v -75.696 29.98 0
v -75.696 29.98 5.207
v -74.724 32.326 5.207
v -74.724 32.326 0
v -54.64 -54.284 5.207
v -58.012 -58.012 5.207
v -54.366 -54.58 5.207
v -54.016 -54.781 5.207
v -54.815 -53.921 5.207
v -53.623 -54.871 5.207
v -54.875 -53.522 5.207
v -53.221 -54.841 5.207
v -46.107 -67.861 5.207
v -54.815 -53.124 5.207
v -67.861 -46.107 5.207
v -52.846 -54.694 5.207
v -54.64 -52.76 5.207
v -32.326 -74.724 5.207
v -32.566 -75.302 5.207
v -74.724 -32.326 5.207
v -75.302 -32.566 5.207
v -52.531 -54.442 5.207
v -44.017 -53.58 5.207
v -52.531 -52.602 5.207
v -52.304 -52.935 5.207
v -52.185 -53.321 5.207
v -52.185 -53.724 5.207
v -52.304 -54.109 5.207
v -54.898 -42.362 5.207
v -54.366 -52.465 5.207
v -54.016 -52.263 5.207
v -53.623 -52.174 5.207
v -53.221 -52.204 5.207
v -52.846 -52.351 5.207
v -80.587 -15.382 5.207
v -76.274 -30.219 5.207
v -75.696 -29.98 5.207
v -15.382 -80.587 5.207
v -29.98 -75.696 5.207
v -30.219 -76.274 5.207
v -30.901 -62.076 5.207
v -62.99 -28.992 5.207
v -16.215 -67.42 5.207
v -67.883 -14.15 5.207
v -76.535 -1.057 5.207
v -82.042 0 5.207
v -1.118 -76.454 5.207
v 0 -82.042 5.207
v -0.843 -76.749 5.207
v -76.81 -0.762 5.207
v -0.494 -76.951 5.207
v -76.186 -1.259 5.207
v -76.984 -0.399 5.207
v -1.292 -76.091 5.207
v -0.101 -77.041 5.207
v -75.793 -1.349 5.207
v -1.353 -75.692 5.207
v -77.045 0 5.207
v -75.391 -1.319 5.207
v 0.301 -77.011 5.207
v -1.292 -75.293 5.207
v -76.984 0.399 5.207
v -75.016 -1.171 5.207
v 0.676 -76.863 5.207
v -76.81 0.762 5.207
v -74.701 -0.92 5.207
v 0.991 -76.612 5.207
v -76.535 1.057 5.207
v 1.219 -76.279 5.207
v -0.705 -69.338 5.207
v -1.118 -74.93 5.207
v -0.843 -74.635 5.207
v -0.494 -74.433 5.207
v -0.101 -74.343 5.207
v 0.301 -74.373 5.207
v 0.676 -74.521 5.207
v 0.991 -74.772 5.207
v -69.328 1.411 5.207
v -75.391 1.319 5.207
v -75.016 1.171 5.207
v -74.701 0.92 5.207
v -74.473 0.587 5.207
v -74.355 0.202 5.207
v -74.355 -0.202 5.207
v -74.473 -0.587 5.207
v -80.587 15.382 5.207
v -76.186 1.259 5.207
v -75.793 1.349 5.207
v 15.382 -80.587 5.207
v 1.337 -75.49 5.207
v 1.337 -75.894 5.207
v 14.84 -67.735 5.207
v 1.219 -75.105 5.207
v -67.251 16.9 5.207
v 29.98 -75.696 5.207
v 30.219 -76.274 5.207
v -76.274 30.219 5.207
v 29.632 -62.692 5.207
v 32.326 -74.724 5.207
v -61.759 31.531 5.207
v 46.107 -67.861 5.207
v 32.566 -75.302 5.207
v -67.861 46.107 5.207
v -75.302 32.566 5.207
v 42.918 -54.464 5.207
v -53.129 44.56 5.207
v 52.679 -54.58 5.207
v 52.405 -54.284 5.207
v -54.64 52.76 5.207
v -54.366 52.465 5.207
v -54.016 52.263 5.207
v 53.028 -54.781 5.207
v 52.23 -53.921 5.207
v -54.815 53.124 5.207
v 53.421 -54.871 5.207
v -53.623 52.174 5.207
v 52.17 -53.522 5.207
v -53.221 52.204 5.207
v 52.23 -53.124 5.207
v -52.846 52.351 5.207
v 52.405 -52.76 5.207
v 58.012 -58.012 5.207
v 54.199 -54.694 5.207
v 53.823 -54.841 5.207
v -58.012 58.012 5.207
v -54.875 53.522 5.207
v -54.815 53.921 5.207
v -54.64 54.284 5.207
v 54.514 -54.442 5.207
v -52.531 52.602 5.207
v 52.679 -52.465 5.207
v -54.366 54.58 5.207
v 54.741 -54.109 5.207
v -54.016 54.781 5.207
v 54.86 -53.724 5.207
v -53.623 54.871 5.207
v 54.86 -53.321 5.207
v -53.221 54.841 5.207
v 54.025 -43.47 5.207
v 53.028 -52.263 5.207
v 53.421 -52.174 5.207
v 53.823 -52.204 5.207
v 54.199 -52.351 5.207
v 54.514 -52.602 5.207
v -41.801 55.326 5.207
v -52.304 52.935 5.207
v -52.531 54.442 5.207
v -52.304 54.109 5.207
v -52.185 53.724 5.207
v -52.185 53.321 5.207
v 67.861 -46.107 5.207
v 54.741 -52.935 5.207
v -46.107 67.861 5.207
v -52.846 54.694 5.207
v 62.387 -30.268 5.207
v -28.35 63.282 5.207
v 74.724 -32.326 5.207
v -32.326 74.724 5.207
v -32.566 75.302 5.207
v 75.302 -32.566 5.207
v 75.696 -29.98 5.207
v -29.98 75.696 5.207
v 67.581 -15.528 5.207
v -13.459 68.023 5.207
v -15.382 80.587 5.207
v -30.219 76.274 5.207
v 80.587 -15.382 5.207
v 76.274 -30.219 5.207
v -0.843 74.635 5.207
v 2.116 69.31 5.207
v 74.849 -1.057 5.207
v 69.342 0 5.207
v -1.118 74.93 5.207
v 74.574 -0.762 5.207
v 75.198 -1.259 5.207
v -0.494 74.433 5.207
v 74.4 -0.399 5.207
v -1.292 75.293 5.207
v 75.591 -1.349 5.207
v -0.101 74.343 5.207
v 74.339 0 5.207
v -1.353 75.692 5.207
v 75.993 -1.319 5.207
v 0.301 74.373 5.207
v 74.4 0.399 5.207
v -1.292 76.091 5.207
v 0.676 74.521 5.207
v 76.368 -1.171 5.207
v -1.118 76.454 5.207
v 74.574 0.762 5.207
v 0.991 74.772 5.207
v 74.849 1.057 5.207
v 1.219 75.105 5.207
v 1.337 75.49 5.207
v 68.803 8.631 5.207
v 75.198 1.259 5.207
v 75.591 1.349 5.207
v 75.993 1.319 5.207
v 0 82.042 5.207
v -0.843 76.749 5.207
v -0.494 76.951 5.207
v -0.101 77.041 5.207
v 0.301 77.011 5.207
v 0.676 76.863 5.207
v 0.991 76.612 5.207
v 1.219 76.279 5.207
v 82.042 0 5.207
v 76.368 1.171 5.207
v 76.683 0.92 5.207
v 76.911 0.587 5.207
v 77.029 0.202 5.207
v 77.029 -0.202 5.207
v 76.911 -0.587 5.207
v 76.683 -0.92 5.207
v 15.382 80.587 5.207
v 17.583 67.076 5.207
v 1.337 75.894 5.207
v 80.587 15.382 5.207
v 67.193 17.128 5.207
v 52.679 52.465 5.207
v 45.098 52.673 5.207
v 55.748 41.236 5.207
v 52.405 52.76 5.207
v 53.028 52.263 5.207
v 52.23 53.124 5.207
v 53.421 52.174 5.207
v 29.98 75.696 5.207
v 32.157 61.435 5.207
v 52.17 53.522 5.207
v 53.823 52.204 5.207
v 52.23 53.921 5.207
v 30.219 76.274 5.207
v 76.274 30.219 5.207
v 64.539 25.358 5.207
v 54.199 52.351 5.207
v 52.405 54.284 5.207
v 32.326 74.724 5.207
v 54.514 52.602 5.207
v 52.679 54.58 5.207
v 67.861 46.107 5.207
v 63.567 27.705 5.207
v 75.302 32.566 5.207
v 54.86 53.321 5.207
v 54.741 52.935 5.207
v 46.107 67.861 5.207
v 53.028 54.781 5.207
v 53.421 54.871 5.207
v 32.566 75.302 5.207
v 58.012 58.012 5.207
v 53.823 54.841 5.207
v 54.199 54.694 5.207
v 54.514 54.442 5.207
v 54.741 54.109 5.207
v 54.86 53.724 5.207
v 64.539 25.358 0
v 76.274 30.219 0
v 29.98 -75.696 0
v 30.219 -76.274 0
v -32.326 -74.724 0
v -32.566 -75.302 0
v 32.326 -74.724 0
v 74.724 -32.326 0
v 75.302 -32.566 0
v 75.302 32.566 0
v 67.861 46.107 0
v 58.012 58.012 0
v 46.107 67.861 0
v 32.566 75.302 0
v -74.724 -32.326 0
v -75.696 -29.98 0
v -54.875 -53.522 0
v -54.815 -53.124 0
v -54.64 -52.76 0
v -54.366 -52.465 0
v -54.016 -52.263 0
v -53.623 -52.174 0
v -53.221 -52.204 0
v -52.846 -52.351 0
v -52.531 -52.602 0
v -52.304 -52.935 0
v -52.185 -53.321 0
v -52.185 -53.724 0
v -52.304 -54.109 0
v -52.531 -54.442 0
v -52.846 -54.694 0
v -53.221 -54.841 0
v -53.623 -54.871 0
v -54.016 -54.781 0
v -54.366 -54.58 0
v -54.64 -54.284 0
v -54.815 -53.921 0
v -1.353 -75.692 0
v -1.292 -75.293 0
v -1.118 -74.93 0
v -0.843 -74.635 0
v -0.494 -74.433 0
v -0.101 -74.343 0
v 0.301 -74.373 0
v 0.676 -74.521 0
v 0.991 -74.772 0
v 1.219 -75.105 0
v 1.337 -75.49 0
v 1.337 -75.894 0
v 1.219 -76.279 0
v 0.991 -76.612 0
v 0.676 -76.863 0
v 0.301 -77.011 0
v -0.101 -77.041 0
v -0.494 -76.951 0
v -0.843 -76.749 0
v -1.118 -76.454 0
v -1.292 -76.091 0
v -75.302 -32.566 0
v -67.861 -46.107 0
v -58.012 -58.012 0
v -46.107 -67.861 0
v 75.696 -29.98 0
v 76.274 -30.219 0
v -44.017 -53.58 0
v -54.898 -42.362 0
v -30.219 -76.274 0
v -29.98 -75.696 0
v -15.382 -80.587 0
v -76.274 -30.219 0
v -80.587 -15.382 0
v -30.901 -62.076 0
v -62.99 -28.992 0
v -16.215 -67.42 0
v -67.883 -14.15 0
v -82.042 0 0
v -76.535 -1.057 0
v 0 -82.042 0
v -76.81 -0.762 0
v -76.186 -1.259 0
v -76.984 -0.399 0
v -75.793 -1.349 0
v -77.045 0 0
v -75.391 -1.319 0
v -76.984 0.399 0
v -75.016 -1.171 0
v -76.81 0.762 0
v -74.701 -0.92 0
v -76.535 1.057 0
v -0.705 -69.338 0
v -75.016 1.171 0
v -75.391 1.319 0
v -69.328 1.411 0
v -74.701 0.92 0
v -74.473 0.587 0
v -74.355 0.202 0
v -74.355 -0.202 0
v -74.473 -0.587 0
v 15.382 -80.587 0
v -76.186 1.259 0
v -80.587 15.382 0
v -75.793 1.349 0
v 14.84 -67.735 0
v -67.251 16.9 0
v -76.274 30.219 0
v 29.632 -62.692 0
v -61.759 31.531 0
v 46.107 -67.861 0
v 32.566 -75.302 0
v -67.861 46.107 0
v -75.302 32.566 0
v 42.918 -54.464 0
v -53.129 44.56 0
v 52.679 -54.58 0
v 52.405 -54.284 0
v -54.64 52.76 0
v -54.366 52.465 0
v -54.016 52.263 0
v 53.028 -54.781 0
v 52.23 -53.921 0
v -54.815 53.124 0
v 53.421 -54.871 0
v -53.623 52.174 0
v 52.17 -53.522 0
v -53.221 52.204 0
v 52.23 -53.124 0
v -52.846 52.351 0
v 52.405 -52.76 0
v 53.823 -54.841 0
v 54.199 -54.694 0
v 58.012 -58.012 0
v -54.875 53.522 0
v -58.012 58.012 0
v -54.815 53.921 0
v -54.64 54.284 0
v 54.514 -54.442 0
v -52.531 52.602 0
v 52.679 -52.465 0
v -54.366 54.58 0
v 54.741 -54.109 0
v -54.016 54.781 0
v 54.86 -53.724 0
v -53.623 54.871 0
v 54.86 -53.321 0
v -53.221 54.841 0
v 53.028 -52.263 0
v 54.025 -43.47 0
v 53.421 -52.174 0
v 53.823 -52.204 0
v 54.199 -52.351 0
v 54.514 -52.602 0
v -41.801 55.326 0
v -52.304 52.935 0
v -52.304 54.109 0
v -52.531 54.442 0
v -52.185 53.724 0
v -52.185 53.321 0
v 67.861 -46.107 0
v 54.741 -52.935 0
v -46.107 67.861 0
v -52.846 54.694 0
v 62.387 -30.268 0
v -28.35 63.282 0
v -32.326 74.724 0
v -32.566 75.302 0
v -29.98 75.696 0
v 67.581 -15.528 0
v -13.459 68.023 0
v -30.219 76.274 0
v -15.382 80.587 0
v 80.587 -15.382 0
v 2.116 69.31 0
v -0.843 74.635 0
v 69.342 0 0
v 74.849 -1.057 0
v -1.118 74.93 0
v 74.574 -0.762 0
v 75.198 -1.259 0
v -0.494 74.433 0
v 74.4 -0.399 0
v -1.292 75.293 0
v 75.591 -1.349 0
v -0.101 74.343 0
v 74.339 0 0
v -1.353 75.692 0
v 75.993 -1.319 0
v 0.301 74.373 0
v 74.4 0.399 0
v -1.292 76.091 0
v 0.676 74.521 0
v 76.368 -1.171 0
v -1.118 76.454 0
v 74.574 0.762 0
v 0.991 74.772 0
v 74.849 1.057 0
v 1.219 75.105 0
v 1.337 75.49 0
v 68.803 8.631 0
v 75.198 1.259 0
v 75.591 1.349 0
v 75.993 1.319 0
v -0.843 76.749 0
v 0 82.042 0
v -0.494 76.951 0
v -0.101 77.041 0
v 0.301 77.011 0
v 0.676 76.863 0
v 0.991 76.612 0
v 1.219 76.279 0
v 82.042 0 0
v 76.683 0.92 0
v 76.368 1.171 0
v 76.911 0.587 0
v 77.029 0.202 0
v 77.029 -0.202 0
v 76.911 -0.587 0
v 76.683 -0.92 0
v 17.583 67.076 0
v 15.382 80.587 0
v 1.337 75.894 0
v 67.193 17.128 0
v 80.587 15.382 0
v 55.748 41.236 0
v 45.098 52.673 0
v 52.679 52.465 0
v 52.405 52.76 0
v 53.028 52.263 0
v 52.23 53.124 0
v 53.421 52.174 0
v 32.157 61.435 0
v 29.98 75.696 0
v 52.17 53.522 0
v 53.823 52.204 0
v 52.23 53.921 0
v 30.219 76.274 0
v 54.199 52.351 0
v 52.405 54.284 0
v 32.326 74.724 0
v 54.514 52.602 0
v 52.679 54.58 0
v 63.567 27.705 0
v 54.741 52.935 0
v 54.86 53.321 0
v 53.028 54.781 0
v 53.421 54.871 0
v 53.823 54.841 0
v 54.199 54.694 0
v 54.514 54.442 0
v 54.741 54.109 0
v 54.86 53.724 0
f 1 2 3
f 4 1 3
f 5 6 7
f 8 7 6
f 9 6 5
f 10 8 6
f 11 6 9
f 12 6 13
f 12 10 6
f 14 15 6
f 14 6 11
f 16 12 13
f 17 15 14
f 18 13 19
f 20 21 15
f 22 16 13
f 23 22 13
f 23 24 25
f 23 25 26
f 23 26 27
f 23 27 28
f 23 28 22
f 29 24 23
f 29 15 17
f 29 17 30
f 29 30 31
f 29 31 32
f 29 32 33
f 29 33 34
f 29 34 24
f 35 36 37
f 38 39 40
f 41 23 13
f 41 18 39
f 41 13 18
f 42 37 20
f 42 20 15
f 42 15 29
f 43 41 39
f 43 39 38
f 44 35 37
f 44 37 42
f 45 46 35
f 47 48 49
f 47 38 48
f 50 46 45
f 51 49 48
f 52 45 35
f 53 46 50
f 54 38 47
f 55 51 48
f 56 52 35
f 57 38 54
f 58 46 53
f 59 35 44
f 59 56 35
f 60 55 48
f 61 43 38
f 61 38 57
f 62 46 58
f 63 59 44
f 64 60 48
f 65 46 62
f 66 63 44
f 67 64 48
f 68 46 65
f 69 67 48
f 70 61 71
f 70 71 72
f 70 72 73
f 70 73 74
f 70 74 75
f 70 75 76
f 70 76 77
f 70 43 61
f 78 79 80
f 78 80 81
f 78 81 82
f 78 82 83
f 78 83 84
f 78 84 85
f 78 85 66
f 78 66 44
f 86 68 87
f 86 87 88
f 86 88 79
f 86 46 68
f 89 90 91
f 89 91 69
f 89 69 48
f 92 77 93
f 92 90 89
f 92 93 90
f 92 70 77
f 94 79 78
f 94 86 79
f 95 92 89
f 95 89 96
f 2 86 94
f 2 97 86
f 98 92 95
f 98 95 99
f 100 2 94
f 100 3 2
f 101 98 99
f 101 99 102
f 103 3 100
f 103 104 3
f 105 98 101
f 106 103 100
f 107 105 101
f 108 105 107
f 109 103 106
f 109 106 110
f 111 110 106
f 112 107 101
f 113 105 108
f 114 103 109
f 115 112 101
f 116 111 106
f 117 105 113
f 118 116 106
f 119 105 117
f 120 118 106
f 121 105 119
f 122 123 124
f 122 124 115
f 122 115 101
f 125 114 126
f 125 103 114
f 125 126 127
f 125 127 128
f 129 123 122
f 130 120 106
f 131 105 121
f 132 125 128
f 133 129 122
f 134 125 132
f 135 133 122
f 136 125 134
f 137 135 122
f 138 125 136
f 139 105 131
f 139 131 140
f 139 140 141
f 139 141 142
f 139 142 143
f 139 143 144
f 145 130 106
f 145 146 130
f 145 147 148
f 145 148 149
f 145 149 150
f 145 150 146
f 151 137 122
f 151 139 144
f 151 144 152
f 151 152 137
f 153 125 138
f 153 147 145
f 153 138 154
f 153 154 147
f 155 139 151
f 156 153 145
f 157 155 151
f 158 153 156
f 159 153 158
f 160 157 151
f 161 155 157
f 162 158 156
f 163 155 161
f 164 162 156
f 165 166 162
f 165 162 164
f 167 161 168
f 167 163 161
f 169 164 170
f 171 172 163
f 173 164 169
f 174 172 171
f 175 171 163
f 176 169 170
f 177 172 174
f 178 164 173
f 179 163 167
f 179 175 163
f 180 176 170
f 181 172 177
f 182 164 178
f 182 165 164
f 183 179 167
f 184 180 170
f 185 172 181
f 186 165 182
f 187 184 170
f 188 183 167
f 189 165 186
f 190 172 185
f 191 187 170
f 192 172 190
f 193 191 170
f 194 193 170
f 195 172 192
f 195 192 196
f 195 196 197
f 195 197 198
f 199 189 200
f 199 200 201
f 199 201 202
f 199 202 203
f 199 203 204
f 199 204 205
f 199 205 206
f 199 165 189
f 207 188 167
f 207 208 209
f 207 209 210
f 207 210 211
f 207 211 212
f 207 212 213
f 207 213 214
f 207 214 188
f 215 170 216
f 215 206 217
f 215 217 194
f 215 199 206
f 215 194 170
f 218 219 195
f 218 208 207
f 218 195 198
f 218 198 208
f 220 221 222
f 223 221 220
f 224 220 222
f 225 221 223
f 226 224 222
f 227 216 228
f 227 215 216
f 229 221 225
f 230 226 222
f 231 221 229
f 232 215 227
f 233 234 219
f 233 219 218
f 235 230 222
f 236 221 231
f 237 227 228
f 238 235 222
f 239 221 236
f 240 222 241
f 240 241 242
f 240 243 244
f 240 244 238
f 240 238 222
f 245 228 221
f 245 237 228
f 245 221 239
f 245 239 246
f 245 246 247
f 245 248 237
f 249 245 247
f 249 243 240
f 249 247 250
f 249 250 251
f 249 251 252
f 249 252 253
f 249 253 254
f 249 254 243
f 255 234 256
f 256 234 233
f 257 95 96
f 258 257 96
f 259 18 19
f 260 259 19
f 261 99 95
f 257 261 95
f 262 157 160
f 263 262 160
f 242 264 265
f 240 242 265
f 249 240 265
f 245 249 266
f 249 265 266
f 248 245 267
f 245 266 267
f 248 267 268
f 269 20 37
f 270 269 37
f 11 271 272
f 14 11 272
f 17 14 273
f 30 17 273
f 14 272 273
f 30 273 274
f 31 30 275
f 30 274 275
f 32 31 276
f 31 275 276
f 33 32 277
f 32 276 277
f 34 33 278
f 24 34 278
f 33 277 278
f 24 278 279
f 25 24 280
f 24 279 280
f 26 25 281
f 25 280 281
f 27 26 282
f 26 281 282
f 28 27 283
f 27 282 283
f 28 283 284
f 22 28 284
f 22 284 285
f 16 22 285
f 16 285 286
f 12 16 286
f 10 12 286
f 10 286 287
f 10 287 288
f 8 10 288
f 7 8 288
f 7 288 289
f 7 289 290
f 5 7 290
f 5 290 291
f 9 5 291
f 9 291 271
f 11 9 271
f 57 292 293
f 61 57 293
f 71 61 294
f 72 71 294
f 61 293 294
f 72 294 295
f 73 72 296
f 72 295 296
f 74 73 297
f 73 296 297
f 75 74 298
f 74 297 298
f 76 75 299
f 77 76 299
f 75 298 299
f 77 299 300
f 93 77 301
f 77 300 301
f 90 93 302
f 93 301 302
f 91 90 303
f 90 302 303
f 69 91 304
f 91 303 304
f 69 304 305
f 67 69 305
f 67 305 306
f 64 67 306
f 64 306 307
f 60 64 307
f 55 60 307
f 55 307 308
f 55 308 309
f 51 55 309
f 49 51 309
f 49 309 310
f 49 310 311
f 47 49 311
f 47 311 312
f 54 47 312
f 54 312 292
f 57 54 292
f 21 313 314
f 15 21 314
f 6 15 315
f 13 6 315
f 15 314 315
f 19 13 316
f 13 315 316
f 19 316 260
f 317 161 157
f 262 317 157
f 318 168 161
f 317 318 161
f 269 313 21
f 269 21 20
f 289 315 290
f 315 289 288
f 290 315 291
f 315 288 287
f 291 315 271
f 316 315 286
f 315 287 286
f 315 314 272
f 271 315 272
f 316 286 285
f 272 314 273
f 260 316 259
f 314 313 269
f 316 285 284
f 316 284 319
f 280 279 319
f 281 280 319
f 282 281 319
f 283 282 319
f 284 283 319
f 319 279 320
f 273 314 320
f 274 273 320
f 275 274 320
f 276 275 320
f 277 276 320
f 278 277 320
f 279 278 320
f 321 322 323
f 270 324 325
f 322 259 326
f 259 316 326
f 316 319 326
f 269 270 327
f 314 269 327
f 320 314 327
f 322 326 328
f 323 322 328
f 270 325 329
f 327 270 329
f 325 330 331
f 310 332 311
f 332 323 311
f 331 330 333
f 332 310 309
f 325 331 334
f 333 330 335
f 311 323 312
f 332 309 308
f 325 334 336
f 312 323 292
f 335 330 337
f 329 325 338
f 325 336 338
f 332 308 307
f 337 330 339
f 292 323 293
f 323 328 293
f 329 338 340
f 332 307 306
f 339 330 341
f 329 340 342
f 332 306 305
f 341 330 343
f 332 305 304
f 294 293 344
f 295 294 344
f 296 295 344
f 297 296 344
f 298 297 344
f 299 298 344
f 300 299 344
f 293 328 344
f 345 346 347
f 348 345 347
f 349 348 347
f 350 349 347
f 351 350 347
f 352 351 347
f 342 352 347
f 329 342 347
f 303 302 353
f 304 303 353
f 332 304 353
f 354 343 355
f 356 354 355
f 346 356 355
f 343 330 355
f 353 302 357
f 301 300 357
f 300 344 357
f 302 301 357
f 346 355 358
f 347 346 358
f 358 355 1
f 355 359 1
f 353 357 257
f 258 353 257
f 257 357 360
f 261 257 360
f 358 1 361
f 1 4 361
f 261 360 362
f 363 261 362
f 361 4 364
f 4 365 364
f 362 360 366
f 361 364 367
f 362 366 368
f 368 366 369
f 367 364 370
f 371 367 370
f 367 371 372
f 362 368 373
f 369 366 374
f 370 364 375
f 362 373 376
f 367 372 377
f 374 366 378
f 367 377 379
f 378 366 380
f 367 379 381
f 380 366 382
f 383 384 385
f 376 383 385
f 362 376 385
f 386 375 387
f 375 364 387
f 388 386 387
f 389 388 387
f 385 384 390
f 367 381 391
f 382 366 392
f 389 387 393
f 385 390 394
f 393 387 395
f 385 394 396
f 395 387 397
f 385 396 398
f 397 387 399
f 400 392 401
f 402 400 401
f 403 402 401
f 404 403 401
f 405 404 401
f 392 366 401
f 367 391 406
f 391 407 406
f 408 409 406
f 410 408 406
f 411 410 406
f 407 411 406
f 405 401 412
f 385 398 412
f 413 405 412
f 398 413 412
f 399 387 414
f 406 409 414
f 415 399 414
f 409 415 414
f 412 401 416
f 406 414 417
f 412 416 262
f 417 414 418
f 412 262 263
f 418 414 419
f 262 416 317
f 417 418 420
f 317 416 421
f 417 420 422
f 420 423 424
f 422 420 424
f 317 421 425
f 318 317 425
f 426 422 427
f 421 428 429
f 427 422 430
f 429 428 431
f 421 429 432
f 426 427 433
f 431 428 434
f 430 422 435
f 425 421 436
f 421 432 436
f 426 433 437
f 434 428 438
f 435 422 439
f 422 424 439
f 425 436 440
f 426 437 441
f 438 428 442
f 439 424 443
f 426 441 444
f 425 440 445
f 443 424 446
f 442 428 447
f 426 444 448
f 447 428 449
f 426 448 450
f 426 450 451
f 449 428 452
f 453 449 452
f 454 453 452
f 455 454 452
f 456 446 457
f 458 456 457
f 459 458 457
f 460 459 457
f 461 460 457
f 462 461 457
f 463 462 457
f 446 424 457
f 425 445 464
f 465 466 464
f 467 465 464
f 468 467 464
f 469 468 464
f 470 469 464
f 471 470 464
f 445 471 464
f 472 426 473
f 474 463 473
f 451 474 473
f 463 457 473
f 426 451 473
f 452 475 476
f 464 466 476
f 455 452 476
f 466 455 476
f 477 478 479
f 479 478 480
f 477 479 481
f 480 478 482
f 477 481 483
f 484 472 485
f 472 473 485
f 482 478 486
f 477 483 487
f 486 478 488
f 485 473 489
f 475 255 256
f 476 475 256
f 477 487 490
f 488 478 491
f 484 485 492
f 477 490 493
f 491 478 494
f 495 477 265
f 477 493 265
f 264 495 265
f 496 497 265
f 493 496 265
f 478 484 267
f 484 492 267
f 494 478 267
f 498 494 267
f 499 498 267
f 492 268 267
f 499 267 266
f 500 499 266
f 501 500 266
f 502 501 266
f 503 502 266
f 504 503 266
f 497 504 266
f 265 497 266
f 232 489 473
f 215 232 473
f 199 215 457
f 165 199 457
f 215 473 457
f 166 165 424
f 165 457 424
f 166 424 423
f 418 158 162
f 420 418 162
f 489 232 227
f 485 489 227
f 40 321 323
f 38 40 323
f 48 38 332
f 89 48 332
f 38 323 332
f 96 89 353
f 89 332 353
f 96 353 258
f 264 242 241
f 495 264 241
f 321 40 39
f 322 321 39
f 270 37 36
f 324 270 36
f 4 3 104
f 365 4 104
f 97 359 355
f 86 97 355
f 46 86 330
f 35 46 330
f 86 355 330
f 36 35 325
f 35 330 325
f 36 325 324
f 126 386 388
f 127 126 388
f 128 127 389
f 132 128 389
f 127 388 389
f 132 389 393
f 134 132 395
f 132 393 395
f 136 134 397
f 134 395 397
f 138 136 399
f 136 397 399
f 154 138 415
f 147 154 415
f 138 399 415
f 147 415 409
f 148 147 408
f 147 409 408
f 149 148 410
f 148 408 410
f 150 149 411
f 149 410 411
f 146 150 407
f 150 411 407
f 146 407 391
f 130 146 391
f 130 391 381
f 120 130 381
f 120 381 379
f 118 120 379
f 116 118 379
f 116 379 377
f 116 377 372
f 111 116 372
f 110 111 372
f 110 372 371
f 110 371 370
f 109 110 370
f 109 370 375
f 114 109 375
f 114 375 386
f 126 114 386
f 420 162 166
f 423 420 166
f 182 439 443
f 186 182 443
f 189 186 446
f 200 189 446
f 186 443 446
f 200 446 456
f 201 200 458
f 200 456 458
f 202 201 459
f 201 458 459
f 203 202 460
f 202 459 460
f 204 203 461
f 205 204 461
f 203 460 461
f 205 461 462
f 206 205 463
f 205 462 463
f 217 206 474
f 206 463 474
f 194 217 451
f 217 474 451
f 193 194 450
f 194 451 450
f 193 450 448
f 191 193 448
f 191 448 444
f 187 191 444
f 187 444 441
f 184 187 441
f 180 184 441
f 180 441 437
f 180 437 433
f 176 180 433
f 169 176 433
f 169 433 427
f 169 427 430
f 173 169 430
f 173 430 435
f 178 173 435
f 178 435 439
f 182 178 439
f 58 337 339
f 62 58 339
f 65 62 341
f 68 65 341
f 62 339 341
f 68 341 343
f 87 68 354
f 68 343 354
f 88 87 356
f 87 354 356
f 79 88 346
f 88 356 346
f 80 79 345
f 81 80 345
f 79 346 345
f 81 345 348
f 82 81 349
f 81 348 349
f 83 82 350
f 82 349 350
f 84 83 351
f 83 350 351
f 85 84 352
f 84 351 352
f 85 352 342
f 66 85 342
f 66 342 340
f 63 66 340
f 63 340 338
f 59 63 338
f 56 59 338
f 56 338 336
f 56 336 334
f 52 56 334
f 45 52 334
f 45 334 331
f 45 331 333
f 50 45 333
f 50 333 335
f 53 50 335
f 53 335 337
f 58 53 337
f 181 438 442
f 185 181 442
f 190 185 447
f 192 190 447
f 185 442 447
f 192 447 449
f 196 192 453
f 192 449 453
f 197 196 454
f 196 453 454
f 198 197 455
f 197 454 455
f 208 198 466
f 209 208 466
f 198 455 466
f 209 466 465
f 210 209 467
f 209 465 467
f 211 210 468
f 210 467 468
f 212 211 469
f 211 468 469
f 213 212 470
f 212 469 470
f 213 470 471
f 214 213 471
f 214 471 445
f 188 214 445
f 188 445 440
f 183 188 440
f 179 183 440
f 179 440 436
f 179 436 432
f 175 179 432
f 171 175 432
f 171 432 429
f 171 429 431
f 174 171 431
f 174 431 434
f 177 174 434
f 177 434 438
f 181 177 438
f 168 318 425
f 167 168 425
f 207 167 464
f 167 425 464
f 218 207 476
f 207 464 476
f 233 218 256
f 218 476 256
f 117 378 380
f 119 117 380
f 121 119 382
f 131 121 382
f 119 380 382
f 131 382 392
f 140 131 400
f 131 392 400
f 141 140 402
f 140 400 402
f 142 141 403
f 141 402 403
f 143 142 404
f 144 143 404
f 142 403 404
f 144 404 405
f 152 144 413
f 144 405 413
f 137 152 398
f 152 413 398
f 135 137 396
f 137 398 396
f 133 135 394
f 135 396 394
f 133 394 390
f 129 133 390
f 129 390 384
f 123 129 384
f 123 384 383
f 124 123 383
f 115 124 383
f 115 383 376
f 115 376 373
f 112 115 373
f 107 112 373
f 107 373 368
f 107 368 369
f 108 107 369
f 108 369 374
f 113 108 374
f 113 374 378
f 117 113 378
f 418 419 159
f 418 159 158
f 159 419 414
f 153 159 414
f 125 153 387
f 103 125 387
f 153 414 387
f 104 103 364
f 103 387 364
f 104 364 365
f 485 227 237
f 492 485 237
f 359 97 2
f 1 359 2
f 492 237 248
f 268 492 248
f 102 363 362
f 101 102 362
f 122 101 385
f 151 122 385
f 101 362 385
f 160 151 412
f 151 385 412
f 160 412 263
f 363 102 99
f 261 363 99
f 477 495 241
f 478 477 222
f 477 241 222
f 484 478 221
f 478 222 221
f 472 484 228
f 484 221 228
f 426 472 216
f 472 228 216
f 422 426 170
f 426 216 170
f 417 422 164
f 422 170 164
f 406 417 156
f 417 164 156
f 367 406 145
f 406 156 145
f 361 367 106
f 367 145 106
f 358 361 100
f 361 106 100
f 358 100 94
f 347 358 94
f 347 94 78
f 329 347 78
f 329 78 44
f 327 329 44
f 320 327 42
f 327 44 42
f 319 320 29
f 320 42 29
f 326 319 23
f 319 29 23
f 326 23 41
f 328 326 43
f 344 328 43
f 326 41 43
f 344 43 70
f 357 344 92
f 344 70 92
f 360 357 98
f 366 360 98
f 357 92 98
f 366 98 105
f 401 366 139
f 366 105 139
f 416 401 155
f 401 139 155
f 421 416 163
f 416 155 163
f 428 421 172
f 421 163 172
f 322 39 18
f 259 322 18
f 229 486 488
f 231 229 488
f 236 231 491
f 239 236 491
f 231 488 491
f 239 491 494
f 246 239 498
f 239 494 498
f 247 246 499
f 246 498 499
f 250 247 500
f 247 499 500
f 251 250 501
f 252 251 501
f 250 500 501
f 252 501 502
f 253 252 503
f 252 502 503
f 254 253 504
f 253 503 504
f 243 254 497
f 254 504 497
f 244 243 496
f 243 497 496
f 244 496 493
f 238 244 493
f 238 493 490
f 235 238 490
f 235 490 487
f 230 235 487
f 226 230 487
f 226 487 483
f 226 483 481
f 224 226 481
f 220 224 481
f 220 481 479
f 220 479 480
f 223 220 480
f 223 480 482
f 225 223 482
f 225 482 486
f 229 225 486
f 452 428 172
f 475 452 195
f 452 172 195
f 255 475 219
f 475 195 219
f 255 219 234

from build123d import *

# Parameters (mm, degrees)
SKETCH4_R             = 82.042
BOSS_EXTRUDE2_DEPTH   = 5.207
SKETCH5_R             = 69.342
CUT_EXTRUDE5_DEPTH    = 6.207
CUT_EXTRUDE11_DEPTH   = 6.207
F_6_32_TAPPED_HOLE1_D = 2.7051


with BuildPart() as part:
    # Sketch4 → Boss-Extrude2 (new body)
    with BuildSketch(Plane.XY):
        Circle(SKETCH4_R)
    extrude(amount=BOSS_EXTRUDE2_DEPTH)

    # Sketch5 → Cut-Extrude5 (cut, through all)
    with BuildSketch(Plane.XY.offset(5.207)):
        Circle(SKETCH5_R)
    extrude(amount=-CUT_EXTRUDE5_DEPTH, mode=Mode.SUBTRACT)

    # Sketch8 → Cut-Extrude11 (cut, through all)
    with BuildSketch(Plane.XY.offset(5.207)):
        Polygon((81.764215182, 35.242484939), (62.990983081, 27.466357594), (63.962998999, 25.119703581), (82.7362311, 32.895830927), align=None)
        Polygon((32.812445144, 75.89758015), (30.465791131, 76.869596069), (29.979783172, 75.696269062), (32.326437185, 74.724253144), align=None)
        Polygon((-30.465791131, 76.869596069), (-32.812445144, 75.89758015), (-32.326437185, 74.724253144), (-29.979783172, 75.696269062), align=None)
        Polygon((-75.89758015, 32.812445144), (-76.869596069, 30.465791131), (-75.696269062, 29.979783172), (-74.724253144, 32.326437185), align=None)
        Polygon((-76.869596069, -30.465791131), (-75.89758015, -32.812445144), (-74.724253144, -32.326437185), (-75.696269062, -29.979783172), align=None)
        Polygon((-32.812445144, -75.89758015), (-30.465791131, -76.869596069), (-29.979783172, -75.696269062), (-32.326437185, -74.724253144), align=None)
        Polygon((30.465791131, -76.869596069), (32.812445144, -75.89758015), (32.326437185, -74.724253144), (29.979783172, -75.696269062), align=None)
        Polygon((75.89758015, -32.812445144), (76.869596069, -30.465791131), (75.696269062, -29.979783172), (74.724253144, -32.326437185), align=None)
    extrude(amount=-CUT_EXTRUDE11_DEPTH, mode=Mode.SUBTRACT)

    # #6-32 Tapped Hole1 (through all)
    with Locations(Plane.XY.offset(5.207)):
        with Locations((75.692, 0), (53.522326482, -53.522326482), (0, -75.692), (-53.522326482, -53.522326482), (-75.692, 0), (-53.522326482, 53.522326482), (0, 75.692), (53.522326482, 53.522326482)):
            Hole(F_6_32_TAPPED_HOLE1_D / 2)


solid = part.part
